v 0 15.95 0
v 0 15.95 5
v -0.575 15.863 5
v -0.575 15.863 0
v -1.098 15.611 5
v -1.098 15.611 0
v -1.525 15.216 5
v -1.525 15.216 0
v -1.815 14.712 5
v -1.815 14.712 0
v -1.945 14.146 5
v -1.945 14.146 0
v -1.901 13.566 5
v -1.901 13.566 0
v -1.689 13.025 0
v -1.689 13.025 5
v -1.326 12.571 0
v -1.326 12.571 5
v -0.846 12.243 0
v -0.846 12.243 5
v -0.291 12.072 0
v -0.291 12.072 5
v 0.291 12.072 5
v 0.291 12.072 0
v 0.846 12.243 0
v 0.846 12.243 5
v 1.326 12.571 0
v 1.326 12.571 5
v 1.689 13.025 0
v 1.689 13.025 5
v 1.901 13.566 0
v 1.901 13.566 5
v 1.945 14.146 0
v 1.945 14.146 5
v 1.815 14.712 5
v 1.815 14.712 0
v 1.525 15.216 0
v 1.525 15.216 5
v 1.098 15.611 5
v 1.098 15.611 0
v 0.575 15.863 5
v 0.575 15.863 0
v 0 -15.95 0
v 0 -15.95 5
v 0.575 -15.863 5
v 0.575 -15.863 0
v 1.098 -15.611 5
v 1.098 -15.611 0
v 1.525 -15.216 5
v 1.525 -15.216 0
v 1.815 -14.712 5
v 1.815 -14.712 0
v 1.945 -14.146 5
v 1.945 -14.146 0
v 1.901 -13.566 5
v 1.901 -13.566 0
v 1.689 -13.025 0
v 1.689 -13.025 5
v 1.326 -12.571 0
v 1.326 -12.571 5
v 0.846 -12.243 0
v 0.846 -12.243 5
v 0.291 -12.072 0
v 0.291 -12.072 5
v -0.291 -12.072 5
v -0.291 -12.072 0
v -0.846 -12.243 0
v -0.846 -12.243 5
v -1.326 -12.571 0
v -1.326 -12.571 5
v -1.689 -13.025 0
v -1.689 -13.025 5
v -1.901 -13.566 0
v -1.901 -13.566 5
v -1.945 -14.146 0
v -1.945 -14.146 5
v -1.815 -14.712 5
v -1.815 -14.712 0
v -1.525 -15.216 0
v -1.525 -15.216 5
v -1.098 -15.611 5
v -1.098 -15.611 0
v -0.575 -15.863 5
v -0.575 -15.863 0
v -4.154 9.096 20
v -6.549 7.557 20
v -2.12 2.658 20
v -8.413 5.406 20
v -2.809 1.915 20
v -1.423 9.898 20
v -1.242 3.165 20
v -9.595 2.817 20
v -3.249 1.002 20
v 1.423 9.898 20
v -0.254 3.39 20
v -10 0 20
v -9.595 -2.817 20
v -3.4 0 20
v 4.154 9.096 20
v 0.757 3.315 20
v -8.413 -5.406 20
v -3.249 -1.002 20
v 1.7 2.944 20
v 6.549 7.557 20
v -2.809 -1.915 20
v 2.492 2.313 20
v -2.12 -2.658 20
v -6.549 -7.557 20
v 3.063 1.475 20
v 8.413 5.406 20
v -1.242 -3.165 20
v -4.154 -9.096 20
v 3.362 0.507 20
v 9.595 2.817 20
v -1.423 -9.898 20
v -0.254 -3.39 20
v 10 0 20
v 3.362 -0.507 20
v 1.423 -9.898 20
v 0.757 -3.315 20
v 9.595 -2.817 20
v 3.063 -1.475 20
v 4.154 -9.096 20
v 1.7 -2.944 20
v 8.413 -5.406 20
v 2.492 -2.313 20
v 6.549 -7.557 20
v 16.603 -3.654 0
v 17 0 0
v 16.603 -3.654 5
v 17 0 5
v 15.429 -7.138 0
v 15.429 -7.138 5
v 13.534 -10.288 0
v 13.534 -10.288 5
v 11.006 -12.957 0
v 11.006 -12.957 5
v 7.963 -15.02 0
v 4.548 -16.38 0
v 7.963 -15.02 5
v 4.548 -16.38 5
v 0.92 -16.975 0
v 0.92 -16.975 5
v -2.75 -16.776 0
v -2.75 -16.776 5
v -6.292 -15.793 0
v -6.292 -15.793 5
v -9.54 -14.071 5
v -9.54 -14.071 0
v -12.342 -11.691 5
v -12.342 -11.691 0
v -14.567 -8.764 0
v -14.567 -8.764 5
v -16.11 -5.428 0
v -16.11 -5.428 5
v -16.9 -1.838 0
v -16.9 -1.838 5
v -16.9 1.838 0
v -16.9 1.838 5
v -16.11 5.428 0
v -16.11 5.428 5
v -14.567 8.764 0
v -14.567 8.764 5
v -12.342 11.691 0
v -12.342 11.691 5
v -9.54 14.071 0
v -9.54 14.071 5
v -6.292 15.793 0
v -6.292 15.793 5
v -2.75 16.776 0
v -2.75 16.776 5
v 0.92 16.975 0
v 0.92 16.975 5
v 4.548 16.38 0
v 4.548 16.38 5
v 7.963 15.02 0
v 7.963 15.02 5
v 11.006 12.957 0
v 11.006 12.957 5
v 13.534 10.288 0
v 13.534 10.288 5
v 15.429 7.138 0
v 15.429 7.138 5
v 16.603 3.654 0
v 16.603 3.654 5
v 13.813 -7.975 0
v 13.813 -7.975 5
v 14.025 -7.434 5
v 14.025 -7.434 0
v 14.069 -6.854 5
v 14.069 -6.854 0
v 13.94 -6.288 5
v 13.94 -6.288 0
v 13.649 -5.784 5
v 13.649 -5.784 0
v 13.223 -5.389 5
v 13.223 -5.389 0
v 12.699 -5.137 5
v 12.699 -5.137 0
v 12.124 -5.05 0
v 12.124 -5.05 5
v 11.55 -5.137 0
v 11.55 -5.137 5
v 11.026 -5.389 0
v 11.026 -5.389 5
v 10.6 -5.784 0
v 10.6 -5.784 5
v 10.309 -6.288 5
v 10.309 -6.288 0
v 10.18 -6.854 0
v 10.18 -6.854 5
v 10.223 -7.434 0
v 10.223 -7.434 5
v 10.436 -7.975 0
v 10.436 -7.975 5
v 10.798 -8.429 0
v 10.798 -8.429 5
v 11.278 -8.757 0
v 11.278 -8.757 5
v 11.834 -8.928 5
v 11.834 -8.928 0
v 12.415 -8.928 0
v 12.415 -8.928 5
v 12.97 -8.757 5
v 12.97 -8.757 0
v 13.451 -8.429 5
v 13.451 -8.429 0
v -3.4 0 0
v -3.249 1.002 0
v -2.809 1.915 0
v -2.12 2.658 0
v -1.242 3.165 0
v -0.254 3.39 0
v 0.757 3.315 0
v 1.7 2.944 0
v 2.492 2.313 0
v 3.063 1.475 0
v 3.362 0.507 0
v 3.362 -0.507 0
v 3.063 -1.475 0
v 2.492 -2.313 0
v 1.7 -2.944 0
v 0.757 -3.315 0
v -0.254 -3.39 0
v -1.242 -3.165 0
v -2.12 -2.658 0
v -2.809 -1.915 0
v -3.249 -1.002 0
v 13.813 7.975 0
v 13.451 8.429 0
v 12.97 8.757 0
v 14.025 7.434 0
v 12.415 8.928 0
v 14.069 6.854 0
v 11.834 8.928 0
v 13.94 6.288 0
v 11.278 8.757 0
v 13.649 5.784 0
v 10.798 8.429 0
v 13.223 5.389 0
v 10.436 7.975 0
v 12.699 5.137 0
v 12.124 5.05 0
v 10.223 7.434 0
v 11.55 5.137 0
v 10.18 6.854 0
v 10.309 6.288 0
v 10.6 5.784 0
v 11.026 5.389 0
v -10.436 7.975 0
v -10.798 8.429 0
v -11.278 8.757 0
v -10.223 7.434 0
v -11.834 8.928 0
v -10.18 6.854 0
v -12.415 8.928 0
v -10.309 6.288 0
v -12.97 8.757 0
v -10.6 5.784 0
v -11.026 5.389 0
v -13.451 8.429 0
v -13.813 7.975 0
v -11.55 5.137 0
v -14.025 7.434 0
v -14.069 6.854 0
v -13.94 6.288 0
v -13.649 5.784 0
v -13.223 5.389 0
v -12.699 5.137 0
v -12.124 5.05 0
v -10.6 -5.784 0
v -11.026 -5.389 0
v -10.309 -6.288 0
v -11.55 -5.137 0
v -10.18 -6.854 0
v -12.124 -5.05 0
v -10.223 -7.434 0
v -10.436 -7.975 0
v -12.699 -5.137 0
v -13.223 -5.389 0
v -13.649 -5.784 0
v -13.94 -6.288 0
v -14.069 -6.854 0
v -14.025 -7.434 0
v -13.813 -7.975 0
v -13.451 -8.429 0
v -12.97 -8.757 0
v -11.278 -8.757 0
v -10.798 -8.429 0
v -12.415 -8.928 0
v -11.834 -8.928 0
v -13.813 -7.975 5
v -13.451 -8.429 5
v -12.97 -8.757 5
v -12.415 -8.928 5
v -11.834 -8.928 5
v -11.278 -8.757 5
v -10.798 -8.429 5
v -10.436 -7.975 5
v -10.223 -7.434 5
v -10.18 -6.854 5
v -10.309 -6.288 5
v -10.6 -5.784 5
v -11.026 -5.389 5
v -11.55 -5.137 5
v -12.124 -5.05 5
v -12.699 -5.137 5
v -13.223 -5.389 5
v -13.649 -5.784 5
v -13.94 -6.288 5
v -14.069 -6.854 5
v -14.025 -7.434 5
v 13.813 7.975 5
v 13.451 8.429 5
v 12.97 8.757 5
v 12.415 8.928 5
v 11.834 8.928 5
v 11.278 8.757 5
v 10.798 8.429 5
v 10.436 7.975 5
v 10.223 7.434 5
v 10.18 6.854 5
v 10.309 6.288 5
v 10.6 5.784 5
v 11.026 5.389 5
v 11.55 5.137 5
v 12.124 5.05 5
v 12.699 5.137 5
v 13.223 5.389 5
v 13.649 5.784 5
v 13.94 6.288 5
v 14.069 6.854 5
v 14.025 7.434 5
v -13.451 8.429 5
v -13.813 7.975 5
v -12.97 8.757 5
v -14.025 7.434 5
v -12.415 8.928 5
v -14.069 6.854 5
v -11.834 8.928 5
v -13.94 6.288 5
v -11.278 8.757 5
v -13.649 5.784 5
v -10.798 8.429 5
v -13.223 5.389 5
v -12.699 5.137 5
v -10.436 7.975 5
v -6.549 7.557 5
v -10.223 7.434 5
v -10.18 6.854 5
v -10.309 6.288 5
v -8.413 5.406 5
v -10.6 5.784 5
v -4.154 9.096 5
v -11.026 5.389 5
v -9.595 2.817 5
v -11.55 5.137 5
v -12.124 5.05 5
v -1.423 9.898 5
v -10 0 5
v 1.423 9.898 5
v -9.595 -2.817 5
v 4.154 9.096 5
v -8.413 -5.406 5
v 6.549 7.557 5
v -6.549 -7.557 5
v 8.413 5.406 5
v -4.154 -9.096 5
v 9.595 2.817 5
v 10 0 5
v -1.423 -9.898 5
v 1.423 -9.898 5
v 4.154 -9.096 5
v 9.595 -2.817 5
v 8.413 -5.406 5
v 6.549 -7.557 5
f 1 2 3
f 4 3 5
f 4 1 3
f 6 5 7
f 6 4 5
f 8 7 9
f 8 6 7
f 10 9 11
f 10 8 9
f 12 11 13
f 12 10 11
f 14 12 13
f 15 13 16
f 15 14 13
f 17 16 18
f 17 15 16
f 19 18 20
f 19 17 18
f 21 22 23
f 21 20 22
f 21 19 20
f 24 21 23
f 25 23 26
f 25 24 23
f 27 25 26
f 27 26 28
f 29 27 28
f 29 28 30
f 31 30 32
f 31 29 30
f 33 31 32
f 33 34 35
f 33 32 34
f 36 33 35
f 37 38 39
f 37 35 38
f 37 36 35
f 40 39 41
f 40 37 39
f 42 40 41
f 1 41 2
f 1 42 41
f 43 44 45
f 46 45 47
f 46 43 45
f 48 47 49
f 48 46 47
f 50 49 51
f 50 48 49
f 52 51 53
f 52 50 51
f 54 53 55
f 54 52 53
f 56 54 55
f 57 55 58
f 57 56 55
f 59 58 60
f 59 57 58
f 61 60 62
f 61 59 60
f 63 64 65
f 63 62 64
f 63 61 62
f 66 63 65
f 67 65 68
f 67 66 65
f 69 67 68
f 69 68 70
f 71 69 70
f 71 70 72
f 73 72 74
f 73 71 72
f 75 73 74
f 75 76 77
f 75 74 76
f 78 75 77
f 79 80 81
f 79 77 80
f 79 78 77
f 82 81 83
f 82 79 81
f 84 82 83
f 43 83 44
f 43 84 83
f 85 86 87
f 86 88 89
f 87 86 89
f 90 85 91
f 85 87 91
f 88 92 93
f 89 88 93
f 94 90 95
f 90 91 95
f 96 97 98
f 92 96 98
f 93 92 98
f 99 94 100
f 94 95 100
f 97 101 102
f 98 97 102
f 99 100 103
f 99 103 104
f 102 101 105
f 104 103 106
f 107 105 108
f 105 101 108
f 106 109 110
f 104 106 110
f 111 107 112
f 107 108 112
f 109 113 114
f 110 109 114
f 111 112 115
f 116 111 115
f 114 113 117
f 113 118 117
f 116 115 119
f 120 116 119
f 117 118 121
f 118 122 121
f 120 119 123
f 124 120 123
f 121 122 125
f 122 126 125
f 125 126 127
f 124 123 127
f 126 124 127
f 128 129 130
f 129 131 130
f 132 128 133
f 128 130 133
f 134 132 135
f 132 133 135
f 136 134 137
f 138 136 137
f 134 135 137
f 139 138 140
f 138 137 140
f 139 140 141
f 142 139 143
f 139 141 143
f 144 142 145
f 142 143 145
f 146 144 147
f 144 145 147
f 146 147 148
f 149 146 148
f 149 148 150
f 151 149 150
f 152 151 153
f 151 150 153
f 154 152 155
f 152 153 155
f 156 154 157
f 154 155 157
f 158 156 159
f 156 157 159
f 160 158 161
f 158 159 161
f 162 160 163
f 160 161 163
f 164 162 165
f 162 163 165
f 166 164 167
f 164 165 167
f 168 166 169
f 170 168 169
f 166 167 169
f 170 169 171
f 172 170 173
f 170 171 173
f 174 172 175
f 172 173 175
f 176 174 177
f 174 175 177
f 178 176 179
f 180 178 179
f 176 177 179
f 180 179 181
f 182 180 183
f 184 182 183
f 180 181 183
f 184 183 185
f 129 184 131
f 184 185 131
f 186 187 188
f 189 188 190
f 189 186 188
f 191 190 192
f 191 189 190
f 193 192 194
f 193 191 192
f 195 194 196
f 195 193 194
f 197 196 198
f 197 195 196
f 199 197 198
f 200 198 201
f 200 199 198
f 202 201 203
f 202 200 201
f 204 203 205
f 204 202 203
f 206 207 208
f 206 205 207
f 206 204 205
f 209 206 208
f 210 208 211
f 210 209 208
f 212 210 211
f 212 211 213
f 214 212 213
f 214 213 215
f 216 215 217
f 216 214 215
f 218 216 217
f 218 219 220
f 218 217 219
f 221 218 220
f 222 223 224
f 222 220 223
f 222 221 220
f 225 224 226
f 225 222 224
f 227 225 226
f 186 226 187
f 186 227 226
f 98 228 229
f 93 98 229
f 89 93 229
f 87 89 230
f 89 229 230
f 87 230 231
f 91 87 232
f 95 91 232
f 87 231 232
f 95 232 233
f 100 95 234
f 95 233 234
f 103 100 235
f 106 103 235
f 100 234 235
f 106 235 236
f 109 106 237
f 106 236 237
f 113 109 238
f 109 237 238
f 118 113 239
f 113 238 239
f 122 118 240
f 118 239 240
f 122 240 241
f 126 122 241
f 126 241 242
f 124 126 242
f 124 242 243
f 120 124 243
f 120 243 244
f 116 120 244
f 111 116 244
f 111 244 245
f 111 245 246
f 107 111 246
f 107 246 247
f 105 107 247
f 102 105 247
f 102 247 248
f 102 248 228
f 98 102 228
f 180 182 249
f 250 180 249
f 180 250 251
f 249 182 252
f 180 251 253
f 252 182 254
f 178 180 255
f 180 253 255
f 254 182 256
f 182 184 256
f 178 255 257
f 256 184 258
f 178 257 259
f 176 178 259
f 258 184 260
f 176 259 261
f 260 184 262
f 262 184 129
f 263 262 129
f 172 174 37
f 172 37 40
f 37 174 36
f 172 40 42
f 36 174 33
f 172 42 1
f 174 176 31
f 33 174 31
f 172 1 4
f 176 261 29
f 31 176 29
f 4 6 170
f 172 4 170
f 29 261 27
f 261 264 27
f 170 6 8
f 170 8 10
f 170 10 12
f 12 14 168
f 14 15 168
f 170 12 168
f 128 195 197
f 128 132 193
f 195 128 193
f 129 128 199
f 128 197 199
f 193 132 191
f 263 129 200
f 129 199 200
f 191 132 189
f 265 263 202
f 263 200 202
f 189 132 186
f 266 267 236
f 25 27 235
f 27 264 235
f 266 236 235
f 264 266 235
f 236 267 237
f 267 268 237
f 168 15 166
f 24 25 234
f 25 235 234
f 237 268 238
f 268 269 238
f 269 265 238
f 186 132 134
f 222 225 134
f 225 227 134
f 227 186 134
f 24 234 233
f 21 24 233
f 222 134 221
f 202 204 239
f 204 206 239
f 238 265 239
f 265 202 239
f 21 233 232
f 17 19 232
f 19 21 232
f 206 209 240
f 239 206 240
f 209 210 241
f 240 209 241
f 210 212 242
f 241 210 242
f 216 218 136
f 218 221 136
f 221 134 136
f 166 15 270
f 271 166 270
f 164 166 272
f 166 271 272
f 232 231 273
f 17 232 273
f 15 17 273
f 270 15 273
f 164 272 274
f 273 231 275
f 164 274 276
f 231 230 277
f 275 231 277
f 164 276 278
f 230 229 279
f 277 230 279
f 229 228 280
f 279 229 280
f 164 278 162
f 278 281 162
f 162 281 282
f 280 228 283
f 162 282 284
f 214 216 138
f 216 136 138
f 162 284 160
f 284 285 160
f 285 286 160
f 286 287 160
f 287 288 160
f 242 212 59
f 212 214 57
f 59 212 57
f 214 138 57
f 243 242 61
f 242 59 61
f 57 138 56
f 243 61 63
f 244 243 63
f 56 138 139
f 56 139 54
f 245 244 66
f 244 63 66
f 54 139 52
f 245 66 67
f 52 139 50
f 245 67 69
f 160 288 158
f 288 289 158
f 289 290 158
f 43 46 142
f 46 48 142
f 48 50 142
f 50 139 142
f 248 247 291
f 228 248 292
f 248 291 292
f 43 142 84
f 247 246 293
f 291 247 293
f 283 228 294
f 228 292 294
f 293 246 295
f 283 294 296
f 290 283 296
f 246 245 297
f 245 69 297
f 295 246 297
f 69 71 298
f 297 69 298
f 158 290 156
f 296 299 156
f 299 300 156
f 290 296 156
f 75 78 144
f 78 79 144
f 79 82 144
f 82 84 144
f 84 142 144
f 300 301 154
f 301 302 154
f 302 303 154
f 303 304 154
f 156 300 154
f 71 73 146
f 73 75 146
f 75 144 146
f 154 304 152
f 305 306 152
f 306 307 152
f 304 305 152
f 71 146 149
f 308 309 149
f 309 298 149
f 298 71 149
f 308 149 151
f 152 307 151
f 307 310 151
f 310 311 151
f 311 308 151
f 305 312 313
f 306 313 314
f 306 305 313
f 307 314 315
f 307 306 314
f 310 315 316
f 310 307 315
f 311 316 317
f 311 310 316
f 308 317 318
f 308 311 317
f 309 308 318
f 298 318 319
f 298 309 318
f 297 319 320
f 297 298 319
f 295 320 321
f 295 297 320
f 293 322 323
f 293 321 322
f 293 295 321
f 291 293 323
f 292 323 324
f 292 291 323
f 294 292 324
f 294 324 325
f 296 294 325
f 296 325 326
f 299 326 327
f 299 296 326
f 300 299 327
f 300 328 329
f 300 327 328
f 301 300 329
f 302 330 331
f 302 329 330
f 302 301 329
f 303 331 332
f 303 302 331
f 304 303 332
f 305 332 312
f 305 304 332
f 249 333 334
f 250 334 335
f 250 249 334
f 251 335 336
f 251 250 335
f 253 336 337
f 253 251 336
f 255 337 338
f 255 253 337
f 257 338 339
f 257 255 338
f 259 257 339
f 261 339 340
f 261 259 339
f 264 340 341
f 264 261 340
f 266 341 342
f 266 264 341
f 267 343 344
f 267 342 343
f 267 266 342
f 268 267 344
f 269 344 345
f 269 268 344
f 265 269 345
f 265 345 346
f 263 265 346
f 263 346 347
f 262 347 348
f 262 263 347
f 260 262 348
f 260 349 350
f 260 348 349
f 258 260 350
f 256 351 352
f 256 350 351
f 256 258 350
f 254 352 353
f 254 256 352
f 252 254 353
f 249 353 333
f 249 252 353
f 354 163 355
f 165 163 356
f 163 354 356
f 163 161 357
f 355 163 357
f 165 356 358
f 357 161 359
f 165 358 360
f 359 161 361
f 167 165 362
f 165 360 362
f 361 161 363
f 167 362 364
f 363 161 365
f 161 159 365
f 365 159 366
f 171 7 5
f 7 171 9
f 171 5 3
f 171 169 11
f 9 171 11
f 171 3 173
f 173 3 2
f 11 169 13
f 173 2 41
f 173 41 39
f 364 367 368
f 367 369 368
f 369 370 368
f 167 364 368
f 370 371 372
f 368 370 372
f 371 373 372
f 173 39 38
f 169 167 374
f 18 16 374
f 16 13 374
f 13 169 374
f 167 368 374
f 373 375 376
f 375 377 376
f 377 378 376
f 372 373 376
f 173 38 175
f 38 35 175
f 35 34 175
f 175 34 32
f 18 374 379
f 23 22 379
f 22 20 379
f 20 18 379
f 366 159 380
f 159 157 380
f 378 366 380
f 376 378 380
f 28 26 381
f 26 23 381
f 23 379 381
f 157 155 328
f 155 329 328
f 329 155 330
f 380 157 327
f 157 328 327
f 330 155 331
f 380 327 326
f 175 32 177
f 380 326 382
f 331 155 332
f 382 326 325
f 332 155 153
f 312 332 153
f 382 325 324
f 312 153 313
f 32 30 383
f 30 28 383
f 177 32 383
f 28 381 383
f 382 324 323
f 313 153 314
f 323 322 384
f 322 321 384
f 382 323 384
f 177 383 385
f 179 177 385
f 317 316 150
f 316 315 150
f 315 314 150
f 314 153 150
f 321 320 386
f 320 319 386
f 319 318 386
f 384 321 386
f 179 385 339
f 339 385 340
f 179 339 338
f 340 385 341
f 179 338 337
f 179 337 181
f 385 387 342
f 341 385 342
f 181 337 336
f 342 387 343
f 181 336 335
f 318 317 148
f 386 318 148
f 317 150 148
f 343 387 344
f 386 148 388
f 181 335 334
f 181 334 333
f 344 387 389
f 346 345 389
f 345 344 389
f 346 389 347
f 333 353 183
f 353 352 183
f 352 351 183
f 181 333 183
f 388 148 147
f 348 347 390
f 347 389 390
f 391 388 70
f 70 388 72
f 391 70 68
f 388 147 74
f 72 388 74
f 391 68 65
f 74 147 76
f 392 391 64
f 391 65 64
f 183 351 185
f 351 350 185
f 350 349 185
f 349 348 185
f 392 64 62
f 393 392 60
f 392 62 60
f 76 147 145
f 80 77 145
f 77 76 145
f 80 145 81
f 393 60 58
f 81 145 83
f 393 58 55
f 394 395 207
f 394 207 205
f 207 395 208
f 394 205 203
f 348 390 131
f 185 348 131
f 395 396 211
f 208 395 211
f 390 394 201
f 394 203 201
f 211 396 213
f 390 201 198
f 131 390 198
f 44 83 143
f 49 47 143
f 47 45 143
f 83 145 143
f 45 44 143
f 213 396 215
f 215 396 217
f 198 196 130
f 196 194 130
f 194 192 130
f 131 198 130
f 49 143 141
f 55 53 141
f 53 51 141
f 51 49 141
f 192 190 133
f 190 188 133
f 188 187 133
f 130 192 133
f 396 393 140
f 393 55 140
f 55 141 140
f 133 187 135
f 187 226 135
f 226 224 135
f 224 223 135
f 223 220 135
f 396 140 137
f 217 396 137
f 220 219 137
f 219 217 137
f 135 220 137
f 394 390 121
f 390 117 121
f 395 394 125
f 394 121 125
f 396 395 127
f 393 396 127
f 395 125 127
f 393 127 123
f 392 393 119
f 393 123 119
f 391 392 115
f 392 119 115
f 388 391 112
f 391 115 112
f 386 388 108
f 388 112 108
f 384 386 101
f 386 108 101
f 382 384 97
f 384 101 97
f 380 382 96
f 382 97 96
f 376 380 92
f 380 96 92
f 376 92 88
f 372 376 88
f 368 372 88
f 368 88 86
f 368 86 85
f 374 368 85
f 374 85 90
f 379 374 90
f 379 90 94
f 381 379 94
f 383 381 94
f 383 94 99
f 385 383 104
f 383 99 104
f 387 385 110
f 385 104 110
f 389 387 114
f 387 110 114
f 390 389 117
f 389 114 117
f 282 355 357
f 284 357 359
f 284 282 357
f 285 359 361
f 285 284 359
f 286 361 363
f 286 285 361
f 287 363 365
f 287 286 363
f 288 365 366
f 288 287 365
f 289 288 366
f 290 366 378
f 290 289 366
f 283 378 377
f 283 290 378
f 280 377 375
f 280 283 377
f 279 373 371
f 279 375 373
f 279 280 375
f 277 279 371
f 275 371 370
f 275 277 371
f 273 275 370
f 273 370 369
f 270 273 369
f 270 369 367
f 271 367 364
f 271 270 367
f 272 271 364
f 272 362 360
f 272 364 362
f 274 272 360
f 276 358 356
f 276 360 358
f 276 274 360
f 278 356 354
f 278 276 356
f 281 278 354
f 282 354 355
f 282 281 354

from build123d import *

# Parameters (mm, degrees)
TALADRO_ROSCADO_M81_D     = 6.8
TALADRO_ROSCADO_M81_DEPTH = 22.25
TALADRO_ROSCADO_M81_TIP   = 2.042926105
MATRIZC1_COUNT            = 6


with BuildPart() as part:
    # Croquis1 → Revolución1 (revolve)
    with BuildSketch(Plane(origin=(0, 0, 0), x_dir=(1, 0, 0), z_dir=(0, 1, 0))):
        Polygon((0, 0), (17, 0), (17, -5), (10, -5), (10, -20), (0, -20), align=None)
    revolve(axis=Axis((0, 0, 0), (0, 0, -1)))

    # Taladro roscado M81
    with Locations(Plane.XY.offset(20)):
        with Locations((0, 0)):
            Hole(TALADRO_ROSCADO_M81_D / 2, depth=TALADRO_ROSCADO_M81_DEPTH)
            with Locations((0, 0, -(TALADRO_ROSCADO_M81_DEPTH + TALADRO_ROSCADO_M81_TIP / 2))):  # 118° drill point
                Cone(0, TALADRO_ROSCADO_M81_D / 2, TALADRO_ROSCADO_M81_TIP, mode=Mode.SUBTRACT)

    # Croquis4 → Taladro de margen para M3.51 (revolve, cut)
    with BuildSketch(Plane(origin=(0, 14, 0), x_dir=(0, 1, 0), z_dir=(1, 0, 0))):
        Polygon((0, 0), (0, 501.171678207), (1.95, 500), (1.95, 0), align=None)
    taladro_de_margen_para_m3_51 = revolve(axis=Axis((0, 14, -6.35), (0, 0, 1)), mode=Mode.SUBTRACT)

    # MatrizC1: Taladro de margen para M3.51 ×6 about axis
    matrizc1_axis = Axis((0, 0, 0), (0, 0, 1))
    for i in range(1, MATRIZC1_COUNT):
        add(taladro_de_margen_para_m3_51.rotate(matrizc1_axis, i * 360 / MATRIZC1_COUNT), mode=Mode.SUBTRACT)


solid = part.part
